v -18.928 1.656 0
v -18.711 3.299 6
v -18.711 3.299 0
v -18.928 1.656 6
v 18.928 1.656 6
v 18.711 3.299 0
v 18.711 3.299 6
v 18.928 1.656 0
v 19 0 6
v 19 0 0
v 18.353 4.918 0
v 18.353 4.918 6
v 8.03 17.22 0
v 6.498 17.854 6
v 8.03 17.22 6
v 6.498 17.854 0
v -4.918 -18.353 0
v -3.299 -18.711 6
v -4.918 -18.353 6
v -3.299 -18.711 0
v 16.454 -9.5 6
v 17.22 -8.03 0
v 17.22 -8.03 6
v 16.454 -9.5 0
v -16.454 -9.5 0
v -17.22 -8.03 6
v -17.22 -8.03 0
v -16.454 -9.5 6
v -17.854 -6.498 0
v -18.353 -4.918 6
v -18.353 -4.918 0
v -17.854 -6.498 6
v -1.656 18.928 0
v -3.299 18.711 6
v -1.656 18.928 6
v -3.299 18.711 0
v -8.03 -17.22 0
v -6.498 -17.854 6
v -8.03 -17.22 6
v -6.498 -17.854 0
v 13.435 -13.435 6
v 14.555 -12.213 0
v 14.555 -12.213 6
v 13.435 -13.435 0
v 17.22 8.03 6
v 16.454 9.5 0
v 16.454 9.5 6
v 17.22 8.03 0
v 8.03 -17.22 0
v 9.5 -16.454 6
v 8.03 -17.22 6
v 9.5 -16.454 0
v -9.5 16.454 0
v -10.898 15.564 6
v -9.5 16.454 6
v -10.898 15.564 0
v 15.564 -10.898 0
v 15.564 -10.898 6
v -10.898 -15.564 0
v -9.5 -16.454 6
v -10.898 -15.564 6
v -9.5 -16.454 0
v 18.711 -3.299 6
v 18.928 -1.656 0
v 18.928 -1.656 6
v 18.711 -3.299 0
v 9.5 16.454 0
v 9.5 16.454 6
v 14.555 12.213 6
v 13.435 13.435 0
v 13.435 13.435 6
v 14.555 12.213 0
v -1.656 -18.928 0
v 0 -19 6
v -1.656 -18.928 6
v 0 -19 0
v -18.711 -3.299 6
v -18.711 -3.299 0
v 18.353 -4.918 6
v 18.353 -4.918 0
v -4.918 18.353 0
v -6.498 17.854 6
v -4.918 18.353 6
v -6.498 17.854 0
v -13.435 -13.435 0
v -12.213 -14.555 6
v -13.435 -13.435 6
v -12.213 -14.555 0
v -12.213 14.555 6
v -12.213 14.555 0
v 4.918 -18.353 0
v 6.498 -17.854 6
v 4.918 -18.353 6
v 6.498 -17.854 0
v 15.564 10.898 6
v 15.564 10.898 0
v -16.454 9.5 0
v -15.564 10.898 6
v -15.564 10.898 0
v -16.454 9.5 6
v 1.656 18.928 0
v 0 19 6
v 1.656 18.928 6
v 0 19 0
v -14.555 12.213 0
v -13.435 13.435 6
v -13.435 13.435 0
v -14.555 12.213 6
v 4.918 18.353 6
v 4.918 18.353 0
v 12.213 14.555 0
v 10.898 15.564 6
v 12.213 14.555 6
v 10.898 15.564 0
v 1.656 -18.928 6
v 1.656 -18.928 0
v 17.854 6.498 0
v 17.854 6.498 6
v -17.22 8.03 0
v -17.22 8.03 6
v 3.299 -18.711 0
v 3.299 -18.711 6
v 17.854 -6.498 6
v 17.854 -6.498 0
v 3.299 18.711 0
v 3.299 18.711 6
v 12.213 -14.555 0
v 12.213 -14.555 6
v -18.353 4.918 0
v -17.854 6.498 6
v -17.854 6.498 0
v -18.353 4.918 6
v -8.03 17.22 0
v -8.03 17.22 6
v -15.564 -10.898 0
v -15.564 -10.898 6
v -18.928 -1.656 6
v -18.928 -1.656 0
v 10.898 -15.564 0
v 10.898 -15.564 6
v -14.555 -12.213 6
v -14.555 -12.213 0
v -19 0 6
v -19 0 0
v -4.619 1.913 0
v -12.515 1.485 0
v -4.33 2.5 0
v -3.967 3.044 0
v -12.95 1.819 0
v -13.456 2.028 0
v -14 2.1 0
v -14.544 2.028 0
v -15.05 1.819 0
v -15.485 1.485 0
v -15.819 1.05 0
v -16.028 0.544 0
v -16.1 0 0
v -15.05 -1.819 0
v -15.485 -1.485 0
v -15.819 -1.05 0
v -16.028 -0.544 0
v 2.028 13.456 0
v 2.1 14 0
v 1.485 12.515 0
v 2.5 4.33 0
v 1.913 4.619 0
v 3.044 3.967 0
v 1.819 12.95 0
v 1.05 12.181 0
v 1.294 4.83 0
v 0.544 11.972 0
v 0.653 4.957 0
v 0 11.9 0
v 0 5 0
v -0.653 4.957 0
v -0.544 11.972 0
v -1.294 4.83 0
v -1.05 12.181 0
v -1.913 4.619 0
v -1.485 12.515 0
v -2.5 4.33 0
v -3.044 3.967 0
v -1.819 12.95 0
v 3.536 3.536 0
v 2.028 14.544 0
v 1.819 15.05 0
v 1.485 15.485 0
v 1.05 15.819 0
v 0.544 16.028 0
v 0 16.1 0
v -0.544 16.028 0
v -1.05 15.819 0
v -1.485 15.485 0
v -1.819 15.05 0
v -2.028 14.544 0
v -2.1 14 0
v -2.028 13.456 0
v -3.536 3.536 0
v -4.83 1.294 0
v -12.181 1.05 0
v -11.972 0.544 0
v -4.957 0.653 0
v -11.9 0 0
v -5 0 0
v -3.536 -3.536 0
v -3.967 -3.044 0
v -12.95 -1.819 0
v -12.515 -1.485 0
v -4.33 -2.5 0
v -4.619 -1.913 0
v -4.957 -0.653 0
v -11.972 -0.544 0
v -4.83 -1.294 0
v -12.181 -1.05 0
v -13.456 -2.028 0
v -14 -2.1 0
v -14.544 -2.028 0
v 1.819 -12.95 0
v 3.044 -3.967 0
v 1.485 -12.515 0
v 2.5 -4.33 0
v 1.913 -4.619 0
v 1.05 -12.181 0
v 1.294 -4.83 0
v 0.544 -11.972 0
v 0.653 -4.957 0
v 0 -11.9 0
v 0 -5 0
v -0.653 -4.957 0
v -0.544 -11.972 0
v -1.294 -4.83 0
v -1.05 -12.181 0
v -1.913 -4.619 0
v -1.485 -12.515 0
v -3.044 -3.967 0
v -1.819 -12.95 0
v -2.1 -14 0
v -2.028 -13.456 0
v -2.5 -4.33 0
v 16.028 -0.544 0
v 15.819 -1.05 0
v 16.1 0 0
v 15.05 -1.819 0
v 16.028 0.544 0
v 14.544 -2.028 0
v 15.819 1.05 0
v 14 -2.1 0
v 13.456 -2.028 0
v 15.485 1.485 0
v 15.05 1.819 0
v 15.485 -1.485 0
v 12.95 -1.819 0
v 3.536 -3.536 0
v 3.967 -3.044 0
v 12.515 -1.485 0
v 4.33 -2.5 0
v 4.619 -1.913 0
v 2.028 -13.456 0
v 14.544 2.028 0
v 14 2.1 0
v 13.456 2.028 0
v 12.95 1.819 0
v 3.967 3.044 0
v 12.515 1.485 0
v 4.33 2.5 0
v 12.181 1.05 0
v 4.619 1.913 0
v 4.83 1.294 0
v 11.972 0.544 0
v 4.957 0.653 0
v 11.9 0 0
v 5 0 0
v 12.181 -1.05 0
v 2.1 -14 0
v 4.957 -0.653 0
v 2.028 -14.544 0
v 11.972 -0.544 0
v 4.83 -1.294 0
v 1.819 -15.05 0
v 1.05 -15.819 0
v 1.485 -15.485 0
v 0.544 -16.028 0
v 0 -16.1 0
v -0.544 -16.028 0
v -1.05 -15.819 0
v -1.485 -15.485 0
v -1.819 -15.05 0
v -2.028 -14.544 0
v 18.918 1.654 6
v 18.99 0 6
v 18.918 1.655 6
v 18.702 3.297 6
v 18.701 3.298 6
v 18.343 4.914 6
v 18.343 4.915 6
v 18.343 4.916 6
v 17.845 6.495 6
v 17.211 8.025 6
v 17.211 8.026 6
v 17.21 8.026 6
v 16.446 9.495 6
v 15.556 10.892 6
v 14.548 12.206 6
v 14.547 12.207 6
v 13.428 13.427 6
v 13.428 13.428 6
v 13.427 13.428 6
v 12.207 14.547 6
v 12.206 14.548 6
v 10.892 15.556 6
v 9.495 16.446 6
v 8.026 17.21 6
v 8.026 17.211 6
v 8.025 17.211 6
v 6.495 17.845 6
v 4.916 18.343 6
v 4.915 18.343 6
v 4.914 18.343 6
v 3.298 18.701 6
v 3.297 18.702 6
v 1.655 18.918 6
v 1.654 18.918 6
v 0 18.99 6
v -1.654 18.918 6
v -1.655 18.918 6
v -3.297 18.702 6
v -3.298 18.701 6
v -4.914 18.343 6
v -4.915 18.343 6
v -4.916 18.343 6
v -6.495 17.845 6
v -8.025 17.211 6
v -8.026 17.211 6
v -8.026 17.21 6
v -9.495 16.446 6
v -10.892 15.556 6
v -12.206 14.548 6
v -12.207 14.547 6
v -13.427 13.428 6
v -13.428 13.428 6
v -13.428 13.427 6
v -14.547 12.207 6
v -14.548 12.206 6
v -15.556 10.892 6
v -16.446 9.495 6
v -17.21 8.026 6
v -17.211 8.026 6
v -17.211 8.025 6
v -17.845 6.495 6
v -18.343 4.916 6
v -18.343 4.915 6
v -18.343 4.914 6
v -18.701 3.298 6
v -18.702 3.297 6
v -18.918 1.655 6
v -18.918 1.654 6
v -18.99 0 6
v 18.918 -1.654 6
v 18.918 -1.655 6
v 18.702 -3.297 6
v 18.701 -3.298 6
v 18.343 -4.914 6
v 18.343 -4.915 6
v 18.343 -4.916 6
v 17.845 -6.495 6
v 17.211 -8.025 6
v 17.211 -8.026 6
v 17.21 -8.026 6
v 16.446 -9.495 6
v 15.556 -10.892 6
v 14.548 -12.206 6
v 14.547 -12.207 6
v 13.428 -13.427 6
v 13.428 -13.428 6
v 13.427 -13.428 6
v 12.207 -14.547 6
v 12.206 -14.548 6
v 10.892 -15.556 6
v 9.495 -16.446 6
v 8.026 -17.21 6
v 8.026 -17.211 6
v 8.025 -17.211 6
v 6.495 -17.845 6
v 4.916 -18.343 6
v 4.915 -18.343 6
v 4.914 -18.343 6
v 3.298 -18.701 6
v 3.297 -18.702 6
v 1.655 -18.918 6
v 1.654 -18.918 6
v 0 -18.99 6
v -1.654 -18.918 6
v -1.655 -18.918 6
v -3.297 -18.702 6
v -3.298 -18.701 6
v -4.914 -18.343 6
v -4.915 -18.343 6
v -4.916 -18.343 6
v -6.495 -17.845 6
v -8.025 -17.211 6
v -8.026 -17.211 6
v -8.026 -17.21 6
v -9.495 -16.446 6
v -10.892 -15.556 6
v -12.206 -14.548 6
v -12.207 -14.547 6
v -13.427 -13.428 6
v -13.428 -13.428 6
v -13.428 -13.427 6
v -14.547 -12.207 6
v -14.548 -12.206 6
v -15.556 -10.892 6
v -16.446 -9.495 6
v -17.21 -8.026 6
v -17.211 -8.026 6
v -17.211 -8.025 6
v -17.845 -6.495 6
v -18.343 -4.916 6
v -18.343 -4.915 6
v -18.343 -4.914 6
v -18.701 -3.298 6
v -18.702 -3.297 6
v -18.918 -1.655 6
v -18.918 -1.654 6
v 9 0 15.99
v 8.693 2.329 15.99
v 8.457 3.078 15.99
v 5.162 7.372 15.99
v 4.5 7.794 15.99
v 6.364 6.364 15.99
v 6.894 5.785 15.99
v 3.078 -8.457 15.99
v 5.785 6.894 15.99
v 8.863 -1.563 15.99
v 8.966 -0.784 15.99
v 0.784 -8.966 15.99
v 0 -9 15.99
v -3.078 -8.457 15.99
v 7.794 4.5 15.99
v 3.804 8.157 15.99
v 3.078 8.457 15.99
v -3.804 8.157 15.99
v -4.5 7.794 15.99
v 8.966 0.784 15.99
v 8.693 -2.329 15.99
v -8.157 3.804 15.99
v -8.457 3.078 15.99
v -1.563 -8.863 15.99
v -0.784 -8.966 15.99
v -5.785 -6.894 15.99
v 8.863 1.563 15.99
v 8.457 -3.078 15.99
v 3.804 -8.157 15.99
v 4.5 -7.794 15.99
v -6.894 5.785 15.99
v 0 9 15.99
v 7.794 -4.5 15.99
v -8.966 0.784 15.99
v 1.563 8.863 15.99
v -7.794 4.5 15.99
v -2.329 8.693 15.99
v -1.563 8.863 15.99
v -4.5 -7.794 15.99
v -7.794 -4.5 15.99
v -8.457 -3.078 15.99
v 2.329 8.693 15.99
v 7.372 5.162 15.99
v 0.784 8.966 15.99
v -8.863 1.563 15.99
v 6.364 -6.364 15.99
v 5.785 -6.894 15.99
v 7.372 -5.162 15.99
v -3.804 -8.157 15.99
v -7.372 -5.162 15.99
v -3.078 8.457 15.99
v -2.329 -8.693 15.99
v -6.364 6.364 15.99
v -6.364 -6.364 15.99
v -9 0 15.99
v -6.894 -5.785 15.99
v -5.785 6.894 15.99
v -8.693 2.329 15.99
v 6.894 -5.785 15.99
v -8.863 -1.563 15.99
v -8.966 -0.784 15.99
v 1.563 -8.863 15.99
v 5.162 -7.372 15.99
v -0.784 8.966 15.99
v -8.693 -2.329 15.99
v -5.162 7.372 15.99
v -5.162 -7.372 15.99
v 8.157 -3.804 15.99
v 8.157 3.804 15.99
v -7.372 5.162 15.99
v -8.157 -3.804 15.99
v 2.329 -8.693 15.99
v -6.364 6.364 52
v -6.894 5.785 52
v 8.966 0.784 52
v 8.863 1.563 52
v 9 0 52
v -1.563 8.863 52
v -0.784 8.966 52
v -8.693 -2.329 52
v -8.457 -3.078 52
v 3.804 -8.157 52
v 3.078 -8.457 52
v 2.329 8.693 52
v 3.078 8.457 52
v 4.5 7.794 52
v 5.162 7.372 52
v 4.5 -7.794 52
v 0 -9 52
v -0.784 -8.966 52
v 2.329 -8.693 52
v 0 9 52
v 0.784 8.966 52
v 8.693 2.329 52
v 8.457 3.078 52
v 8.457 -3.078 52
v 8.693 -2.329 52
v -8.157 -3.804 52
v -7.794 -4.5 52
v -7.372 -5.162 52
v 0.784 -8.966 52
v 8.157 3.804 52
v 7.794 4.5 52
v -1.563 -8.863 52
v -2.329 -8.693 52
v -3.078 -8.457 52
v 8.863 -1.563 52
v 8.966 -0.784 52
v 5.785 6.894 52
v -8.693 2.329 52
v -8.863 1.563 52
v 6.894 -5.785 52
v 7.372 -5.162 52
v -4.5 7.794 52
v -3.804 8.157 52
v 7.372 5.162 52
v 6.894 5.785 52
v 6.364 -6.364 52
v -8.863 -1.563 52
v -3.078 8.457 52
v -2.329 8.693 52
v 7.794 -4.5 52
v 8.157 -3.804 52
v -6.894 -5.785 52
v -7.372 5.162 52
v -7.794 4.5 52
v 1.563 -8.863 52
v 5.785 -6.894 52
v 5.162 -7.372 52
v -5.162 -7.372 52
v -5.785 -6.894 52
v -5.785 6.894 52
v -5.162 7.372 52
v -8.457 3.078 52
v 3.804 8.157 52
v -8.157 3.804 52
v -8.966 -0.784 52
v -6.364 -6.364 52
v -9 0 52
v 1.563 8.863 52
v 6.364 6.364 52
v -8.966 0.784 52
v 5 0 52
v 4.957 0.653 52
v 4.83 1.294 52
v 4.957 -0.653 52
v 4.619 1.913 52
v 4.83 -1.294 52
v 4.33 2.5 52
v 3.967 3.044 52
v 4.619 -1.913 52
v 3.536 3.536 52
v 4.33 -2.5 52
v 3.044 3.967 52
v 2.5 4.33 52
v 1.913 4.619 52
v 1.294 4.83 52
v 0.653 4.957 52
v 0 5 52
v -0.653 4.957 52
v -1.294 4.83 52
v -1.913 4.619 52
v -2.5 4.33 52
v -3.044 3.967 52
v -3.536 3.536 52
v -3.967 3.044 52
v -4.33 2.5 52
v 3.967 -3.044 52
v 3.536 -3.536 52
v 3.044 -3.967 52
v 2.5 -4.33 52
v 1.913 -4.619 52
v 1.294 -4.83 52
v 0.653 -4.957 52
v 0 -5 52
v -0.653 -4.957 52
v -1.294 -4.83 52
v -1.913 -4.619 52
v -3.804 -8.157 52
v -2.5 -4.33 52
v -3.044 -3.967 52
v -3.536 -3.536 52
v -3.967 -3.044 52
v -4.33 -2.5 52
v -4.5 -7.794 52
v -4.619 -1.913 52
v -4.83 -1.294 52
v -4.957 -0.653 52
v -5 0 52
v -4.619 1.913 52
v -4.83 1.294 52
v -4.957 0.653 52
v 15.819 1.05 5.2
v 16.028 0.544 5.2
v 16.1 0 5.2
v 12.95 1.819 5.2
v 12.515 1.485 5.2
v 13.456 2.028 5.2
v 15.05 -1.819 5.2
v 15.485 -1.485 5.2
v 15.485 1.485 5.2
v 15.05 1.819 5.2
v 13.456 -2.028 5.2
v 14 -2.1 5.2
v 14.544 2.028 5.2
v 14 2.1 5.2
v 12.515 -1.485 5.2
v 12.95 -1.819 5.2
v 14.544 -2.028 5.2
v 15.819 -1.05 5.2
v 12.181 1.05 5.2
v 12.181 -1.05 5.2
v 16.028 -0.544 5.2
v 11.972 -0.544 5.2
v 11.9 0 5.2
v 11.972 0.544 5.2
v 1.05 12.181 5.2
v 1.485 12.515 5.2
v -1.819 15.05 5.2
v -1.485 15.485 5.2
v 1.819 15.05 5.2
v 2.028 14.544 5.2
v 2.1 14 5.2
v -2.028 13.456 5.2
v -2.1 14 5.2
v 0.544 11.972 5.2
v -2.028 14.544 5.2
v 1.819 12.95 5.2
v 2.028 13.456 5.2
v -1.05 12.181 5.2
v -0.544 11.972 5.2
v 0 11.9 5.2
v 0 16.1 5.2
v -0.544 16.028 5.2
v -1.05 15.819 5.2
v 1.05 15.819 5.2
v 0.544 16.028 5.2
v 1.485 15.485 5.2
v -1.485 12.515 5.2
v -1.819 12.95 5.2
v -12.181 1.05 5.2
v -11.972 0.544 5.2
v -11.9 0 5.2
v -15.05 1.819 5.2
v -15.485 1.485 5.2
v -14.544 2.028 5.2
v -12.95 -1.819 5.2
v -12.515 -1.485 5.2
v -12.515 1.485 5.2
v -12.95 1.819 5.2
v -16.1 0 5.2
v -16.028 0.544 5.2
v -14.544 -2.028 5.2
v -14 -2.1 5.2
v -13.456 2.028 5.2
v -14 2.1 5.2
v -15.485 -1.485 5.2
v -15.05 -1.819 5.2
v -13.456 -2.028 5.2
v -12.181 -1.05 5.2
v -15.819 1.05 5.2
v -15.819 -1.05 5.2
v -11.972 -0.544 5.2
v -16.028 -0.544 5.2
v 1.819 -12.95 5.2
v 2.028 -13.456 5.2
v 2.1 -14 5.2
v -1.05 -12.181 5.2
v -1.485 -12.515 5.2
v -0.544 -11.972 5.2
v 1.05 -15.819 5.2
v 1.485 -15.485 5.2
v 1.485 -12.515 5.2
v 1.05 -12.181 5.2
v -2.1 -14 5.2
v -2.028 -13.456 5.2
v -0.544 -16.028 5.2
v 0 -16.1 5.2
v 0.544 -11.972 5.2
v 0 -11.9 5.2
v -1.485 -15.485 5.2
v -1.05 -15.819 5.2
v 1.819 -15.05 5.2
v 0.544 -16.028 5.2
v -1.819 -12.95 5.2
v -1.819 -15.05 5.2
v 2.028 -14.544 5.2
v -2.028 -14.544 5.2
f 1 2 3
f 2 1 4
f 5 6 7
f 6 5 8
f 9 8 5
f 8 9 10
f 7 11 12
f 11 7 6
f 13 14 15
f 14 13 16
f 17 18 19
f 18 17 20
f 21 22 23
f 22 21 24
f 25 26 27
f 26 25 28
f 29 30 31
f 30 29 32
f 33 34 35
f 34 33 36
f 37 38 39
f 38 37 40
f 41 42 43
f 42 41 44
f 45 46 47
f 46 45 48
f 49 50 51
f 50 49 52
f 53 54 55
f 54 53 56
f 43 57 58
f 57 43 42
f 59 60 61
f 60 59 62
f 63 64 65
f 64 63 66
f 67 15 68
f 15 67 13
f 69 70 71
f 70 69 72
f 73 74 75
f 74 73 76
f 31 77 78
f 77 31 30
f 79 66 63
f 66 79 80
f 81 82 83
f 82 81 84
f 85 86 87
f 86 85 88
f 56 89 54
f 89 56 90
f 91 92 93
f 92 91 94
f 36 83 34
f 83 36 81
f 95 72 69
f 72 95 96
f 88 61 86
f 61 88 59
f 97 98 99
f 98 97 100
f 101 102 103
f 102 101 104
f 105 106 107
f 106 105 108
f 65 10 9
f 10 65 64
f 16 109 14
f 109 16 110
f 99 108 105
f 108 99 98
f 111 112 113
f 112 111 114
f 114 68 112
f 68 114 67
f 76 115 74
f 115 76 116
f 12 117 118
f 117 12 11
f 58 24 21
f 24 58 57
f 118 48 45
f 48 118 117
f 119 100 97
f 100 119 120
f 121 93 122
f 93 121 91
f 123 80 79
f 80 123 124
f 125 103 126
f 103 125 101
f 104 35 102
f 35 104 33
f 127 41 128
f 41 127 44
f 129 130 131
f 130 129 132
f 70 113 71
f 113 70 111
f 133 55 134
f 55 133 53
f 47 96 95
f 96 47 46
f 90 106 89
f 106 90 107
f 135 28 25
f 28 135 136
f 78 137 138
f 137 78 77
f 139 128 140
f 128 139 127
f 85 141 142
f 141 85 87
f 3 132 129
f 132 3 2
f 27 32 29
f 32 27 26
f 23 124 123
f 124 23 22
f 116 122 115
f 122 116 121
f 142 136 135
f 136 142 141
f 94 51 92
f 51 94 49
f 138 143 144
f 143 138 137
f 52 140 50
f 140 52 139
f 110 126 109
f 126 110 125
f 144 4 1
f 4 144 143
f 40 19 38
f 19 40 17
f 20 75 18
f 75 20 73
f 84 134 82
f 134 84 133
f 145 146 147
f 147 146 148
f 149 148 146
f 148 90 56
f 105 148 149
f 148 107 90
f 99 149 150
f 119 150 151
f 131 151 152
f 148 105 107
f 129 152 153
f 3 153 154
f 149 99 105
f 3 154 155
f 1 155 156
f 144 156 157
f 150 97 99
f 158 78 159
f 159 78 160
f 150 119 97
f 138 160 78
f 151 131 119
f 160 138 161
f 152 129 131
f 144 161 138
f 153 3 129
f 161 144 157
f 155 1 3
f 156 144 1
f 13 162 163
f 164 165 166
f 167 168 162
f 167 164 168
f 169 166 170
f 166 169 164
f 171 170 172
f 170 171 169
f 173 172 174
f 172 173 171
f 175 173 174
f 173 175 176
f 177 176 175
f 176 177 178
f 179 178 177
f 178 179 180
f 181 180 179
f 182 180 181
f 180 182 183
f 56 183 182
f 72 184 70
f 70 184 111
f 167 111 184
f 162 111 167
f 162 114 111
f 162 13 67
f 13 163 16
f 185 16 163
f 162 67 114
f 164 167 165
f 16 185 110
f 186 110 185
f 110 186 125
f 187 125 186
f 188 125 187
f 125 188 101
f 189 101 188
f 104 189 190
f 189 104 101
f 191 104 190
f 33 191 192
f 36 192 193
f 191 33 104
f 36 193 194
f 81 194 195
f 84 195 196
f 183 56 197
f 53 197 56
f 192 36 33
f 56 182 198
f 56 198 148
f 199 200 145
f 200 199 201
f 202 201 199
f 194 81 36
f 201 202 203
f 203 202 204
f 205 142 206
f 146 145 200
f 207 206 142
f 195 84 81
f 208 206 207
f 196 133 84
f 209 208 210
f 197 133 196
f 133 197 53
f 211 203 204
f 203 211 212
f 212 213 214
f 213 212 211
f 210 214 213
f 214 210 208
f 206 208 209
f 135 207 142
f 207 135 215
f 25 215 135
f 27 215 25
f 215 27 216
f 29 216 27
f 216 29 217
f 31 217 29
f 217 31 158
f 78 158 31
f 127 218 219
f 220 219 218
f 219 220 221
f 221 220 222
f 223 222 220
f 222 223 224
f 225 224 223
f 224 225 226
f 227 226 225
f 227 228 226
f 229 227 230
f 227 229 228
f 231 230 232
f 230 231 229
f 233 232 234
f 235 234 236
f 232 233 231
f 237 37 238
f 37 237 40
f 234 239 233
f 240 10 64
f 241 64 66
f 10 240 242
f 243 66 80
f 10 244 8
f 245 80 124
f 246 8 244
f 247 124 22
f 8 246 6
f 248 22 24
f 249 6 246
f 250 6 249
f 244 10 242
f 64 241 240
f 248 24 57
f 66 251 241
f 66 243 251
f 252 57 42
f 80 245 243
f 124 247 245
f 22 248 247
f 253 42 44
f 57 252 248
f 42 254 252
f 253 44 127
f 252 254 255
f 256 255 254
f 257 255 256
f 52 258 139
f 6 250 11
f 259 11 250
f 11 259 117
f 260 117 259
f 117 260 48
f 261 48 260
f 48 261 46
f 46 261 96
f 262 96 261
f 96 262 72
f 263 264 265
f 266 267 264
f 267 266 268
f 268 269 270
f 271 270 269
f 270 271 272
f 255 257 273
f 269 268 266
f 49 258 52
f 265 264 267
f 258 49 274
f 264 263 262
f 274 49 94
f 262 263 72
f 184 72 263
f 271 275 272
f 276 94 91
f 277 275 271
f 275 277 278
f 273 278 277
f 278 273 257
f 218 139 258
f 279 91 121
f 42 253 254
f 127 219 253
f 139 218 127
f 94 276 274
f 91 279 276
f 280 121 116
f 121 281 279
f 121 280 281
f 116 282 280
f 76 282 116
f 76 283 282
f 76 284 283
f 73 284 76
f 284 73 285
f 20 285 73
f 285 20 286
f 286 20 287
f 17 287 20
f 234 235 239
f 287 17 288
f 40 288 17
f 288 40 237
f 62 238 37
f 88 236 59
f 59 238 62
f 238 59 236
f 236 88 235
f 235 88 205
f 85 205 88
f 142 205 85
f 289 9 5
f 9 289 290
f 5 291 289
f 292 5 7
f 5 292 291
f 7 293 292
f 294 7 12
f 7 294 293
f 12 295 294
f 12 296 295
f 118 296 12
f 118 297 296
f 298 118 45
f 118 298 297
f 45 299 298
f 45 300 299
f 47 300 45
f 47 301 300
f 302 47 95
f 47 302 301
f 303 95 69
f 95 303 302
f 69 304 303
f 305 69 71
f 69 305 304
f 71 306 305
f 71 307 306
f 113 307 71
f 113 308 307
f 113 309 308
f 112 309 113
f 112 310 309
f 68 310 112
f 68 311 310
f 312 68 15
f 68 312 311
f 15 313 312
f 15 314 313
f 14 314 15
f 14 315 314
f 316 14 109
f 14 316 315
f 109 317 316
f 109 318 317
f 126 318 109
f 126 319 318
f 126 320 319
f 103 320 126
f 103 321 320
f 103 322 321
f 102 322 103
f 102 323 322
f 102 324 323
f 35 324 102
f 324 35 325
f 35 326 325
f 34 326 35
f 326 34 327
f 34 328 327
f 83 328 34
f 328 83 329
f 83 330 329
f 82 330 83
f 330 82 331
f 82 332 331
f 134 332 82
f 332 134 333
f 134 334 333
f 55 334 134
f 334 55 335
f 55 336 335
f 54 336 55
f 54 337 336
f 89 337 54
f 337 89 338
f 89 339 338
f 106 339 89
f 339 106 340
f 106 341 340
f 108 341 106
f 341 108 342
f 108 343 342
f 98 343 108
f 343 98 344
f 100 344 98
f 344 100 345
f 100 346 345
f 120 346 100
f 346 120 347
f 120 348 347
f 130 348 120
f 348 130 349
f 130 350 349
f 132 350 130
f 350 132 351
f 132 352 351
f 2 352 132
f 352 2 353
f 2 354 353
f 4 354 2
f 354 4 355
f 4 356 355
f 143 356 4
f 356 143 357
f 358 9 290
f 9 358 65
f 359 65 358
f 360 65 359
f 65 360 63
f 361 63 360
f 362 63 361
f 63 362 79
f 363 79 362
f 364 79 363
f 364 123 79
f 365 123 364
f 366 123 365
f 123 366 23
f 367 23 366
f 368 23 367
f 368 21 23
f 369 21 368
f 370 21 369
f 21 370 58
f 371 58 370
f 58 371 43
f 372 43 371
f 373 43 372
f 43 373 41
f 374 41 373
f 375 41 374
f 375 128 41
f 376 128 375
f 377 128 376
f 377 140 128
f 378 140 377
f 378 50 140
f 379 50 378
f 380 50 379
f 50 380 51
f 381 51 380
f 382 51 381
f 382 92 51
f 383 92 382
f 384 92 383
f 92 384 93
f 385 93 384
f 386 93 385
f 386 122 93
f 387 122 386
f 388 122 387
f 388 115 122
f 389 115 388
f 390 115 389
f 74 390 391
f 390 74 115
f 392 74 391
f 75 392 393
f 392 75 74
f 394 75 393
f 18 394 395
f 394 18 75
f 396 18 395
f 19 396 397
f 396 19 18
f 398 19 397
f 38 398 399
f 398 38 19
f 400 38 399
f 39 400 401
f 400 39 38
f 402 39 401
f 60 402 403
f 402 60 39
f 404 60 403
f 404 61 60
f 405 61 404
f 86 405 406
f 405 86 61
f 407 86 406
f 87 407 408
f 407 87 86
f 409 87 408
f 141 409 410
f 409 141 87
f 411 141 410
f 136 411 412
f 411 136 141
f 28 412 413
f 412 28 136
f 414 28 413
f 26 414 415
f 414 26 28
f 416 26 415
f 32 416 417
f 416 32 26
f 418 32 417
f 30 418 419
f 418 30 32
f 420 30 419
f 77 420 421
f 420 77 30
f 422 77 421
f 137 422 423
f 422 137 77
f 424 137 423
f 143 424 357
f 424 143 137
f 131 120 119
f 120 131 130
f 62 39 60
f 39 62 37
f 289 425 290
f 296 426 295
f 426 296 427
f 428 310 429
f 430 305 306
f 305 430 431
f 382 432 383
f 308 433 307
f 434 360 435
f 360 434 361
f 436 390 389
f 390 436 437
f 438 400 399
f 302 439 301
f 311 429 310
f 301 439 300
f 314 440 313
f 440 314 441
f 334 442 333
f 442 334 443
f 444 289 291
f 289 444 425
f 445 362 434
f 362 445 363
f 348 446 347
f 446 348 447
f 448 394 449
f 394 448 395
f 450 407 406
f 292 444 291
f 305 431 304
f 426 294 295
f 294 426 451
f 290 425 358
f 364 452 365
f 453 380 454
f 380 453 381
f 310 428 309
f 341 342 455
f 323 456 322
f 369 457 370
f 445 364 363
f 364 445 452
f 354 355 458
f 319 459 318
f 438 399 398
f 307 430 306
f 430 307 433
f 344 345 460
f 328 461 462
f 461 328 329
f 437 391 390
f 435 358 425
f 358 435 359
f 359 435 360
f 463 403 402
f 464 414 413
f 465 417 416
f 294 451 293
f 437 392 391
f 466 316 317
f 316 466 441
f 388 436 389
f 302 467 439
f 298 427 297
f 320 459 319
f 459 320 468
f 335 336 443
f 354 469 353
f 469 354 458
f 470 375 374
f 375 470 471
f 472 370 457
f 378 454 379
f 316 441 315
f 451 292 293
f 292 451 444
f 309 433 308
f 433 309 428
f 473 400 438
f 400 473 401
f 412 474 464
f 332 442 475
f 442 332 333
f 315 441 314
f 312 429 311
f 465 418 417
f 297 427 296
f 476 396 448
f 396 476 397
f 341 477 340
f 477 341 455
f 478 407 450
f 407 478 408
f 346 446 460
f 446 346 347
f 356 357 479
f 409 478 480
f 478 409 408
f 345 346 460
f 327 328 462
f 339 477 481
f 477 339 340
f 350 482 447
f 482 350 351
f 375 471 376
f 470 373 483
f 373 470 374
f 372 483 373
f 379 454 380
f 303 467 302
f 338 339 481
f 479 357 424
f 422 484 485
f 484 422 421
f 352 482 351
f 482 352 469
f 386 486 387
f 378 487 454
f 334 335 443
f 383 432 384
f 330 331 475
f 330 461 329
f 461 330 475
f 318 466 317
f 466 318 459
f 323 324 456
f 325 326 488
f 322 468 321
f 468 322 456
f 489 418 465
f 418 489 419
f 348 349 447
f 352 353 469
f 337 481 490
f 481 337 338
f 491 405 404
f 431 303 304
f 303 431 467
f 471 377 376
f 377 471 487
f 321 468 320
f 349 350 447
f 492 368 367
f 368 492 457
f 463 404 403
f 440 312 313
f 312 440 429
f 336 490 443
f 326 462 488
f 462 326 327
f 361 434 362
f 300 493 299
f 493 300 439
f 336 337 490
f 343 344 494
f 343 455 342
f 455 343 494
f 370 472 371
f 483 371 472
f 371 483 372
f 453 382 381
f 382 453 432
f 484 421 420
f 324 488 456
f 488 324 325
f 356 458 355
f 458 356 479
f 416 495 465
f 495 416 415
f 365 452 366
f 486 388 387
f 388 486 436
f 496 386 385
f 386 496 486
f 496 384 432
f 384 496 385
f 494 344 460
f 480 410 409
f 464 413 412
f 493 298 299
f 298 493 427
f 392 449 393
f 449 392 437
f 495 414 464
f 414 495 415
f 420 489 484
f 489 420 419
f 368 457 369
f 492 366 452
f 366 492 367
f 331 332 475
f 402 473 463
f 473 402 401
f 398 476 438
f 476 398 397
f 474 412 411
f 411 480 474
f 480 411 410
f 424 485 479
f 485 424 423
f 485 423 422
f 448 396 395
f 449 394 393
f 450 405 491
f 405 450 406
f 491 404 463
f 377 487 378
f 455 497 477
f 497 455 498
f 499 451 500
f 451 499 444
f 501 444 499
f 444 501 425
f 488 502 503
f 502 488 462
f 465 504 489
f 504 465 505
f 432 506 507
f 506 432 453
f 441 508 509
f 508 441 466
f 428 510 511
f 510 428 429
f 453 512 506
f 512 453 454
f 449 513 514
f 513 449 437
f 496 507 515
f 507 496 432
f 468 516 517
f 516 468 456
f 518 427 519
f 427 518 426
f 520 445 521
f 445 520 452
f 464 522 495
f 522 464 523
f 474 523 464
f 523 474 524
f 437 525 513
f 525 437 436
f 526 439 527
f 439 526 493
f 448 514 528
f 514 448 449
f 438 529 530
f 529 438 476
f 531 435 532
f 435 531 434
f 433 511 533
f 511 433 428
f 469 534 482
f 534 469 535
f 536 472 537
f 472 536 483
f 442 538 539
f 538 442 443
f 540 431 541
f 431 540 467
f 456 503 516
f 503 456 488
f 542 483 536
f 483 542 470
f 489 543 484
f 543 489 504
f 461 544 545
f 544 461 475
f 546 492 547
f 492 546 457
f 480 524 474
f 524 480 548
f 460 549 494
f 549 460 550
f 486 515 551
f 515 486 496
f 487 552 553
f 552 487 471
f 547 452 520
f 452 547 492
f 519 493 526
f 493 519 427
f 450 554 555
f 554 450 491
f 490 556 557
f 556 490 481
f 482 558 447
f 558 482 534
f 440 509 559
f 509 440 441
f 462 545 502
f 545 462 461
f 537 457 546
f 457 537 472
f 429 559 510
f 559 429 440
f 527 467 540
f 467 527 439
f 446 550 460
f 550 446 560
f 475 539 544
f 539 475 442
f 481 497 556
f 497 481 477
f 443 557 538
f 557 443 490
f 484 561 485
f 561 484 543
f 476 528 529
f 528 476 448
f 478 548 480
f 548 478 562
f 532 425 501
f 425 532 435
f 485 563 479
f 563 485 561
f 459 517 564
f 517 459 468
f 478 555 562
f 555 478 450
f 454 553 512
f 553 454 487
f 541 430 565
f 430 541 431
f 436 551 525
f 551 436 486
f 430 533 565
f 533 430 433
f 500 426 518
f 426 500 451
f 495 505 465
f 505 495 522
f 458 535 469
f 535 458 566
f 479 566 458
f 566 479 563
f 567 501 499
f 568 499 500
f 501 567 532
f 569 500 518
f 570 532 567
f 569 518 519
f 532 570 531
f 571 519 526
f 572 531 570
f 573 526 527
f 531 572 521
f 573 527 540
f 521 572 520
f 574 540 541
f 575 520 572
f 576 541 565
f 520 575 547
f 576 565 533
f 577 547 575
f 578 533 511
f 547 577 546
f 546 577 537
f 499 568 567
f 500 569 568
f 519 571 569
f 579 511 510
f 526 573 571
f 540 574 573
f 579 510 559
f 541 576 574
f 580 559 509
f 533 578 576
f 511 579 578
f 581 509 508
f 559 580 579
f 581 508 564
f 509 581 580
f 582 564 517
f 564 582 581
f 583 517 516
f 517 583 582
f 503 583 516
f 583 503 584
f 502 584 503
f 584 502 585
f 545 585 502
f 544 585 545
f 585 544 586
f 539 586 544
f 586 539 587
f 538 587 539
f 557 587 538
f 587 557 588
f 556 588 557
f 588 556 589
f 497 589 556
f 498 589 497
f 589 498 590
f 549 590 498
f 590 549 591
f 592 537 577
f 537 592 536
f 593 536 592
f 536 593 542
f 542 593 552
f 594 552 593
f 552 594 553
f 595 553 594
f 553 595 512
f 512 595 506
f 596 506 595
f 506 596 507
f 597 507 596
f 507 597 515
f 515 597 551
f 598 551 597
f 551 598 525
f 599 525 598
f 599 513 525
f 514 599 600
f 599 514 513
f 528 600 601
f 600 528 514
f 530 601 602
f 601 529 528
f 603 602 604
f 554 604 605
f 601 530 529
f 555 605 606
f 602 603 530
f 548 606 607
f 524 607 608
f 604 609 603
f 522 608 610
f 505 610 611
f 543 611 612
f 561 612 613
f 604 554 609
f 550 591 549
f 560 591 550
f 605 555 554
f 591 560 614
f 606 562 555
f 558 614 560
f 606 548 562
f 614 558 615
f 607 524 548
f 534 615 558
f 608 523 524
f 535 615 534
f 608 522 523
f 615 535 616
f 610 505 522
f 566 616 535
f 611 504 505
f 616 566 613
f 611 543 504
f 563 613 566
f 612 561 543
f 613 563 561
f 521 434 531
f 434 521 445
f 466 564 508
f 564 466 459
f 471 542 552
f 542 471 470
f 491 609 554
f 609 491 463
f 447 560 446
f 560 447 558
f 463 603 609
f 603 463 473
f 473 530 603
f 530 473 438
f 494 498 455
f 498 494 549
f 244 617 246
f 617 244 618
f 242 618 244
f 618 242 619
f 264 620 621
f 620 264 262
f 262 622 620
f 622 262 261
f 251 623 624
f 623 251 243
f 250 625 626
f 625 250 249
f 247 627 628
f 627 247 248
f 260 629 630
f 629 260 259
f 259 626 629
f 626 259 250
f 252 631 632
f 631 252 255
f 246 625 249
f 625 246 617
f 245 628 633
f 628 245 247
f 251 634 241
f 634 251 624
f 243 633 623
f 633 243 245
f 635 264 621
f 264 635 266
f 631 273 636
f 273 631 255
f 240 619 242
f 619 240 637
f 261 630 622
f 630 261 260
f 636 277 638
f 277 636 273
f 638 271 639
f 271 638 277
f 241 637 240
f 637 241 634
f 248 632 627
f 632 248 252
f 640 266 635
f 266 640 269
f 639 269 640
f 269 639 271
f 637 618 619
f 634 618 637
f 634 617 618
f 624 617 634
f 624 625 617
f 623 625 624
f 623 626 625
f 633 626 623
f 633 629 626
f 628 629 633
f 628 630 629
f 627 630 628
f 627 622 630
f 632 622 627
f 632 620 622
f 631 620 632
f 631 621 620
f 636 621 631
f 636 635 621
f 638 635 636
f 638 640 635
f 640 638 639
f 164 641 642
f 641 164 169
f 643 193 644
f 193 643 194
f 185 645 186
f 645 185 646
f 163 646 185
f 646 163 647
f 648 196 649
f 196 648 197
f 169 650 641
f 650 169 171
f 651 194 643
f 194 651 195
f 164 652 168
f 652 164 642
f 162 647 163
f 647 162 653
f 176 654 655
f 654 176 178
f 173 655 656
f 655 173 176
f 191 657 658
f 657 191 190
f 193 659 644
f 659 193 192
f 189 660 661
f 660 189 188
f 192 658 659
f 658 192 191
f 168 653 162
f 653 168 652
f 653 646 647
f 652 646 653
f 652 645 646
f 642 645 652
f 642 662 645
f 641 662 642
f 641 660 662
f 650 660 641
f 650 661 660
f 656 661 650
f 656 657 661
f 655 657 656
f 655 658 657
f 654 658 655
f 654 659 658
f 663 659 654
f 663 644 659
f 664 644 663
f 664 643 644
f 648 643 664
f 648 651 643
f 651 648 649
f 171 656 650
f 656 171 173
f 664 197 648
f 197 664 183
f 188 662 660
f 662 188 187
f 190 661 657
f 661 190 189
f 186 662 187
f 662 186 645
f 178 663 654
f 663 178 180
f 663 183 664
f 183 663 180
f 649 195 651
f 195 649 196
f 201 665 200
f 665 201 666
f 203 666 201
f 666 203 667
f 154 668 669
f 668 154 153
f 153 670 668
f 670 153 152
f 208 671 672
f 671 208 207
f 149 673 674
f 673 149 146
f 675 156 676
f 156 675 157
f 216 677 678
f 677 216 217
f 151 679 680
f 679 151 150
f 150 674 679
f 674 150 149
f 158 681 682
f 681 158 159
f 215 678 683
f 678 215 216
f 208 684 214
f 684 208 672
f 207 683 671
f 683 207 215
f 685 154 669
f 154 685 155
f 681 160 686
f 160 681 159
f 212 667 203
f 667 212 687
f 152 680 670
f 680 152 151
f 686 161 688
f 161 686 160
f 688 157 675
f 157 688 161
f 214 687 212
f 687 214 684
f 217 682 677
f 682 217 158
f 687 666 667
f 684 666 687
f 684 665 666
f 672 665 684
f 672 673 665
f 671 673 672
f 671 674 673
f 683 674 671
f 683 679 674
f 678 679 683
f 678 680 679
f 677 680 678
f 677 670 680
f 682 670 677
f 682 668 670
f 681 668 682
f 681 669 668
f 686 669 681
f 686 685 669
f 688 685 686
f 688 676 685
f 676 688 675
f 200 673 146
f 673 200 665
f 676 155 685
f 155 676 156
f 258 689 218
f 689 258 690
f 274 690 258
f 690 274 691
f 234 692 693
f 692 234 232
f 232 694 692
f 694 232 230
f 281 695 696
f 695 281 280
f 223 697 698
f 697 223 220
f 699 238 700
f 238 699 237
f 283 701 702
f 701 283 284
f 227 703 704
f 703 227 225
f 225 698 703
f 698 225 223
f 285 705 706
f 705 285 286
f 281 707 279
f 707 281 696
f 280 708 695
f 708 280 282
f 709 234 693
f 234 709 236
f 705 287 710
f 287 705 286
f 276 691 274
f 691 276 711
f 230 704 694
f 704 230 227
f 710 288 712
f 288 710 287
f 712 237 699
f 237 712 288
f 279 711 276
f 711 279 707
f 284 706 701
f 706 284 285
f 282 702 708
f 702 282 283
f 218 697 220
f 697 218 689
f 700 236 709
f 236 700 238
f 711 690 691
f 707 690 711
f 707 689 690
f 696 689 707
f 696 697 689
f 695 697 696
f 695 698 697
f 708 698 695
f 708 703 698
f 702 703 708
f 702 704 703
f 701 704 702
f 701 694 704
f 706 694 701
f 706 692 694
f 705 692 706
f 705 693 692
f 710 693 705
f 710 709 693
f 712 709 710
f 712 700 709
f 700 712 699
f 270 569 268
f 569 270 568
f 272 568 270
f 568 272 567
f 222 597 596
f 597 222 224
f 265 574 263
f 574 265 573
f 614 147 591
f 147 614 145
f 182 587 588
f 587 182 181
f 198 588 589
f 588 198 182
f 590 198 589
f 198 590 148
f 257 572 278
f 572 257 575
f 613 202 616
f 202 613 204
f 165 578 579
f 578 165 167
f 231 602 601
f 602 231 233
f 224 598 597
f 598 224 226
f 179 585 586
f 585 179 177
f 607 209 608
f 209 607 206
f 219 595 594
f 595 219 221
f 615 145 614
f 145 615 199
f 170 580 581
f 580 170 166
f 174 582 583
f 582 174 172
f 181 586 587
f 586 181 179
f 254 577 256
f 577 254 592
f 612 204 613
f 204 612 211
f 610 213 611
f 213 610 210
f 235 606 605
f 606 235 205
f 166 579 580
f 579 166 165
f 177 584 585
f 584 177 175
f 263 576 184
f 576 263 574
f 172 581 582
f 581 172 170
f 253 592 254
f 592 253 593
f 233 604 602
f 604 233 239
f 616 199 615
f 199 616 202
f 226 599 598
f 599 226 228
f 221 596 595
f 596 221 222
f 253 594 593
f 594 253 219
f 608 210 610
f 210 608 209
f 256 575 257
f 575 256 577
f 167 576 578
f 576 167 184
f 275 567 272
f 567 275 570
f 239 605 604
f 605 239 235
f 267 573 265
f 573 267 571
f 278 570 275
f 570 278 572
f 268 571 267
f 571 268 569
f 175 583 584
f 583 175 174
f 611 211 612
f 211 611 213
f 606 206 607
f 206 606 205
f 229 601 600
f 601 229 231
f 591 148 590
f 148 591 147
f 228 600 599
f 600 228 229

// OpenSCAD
// =====================================================================
//  robot body :: support pillar. Print 4.
//  robot frame: tube OD/ID rb_pillar (18/10), z 18 .. 70 at each bay_screw_xy; the top
//  bears on the underside of the lid mount boss (z 70). Bottom flange d38, z 18..24, with
//  4x M3 heat-set insert holes (d4.2, 5.2 deep, from below) at 14 mm / 0,90,180,270 deg
//  = rb_fix_pillar, screws from below through the floor. The bore is open through the
//  flange (M3x60 head + hex key). 45-deg cone from flange to tube.
//  robot_pillar(i) places pillar i at bay_screw_xy[i]; robot_pillar_print() = one pillar.
//  Print: flange down, no supports.
// =====================================================================
include <../lib/params.scad>
include <../lib/robot_params.scad>

rp_fl_d = 38;  rp_fl_t = 6;  rp_z1 = 70;

module robot_pillar_at0() {
    difference() {
        union() {
            translate([0, 0, rb_floor_top]) cylinder(d = rp_fl_d, h = rp_fl_t, $fn = 72);
            translate([0, 0, rb_floor_top + rp_fl_t - 0.01])
                cylinder(d1 = rp_fl_d, d2 = rb_pillar[0], h = (rp_fl_d - rb_pillar[0]) / 2, $fn = 72);
            translate([0, 0, rb_floor_top]) cylinder(d = rb_pillar[0], h = rp_z1 - rb_floor_top, $fn = 72);
        }
        translate([0, 0, rb_floor_top - 1]) cylinder(d = rb_pillar[1], h = 60, $fn = 48);
        for (a = [0, 90, 180, 270]) translate([14 * cos(a), 14 * sin(a), rb_floor_top - 1])
            cylinder(d = m3_insert_d, h = 6.2, $fn = 24);
    }
}
module robot_pillar(i = 0) translate([bay_screw_xy[i][0], bay_screw_xy[i][1], 0]) robot_pillar_at0();
module robot_pillar_print() translate([0, 0, -rb_floor_top]) robot_pillar_at0();

robot_pillar_print();
